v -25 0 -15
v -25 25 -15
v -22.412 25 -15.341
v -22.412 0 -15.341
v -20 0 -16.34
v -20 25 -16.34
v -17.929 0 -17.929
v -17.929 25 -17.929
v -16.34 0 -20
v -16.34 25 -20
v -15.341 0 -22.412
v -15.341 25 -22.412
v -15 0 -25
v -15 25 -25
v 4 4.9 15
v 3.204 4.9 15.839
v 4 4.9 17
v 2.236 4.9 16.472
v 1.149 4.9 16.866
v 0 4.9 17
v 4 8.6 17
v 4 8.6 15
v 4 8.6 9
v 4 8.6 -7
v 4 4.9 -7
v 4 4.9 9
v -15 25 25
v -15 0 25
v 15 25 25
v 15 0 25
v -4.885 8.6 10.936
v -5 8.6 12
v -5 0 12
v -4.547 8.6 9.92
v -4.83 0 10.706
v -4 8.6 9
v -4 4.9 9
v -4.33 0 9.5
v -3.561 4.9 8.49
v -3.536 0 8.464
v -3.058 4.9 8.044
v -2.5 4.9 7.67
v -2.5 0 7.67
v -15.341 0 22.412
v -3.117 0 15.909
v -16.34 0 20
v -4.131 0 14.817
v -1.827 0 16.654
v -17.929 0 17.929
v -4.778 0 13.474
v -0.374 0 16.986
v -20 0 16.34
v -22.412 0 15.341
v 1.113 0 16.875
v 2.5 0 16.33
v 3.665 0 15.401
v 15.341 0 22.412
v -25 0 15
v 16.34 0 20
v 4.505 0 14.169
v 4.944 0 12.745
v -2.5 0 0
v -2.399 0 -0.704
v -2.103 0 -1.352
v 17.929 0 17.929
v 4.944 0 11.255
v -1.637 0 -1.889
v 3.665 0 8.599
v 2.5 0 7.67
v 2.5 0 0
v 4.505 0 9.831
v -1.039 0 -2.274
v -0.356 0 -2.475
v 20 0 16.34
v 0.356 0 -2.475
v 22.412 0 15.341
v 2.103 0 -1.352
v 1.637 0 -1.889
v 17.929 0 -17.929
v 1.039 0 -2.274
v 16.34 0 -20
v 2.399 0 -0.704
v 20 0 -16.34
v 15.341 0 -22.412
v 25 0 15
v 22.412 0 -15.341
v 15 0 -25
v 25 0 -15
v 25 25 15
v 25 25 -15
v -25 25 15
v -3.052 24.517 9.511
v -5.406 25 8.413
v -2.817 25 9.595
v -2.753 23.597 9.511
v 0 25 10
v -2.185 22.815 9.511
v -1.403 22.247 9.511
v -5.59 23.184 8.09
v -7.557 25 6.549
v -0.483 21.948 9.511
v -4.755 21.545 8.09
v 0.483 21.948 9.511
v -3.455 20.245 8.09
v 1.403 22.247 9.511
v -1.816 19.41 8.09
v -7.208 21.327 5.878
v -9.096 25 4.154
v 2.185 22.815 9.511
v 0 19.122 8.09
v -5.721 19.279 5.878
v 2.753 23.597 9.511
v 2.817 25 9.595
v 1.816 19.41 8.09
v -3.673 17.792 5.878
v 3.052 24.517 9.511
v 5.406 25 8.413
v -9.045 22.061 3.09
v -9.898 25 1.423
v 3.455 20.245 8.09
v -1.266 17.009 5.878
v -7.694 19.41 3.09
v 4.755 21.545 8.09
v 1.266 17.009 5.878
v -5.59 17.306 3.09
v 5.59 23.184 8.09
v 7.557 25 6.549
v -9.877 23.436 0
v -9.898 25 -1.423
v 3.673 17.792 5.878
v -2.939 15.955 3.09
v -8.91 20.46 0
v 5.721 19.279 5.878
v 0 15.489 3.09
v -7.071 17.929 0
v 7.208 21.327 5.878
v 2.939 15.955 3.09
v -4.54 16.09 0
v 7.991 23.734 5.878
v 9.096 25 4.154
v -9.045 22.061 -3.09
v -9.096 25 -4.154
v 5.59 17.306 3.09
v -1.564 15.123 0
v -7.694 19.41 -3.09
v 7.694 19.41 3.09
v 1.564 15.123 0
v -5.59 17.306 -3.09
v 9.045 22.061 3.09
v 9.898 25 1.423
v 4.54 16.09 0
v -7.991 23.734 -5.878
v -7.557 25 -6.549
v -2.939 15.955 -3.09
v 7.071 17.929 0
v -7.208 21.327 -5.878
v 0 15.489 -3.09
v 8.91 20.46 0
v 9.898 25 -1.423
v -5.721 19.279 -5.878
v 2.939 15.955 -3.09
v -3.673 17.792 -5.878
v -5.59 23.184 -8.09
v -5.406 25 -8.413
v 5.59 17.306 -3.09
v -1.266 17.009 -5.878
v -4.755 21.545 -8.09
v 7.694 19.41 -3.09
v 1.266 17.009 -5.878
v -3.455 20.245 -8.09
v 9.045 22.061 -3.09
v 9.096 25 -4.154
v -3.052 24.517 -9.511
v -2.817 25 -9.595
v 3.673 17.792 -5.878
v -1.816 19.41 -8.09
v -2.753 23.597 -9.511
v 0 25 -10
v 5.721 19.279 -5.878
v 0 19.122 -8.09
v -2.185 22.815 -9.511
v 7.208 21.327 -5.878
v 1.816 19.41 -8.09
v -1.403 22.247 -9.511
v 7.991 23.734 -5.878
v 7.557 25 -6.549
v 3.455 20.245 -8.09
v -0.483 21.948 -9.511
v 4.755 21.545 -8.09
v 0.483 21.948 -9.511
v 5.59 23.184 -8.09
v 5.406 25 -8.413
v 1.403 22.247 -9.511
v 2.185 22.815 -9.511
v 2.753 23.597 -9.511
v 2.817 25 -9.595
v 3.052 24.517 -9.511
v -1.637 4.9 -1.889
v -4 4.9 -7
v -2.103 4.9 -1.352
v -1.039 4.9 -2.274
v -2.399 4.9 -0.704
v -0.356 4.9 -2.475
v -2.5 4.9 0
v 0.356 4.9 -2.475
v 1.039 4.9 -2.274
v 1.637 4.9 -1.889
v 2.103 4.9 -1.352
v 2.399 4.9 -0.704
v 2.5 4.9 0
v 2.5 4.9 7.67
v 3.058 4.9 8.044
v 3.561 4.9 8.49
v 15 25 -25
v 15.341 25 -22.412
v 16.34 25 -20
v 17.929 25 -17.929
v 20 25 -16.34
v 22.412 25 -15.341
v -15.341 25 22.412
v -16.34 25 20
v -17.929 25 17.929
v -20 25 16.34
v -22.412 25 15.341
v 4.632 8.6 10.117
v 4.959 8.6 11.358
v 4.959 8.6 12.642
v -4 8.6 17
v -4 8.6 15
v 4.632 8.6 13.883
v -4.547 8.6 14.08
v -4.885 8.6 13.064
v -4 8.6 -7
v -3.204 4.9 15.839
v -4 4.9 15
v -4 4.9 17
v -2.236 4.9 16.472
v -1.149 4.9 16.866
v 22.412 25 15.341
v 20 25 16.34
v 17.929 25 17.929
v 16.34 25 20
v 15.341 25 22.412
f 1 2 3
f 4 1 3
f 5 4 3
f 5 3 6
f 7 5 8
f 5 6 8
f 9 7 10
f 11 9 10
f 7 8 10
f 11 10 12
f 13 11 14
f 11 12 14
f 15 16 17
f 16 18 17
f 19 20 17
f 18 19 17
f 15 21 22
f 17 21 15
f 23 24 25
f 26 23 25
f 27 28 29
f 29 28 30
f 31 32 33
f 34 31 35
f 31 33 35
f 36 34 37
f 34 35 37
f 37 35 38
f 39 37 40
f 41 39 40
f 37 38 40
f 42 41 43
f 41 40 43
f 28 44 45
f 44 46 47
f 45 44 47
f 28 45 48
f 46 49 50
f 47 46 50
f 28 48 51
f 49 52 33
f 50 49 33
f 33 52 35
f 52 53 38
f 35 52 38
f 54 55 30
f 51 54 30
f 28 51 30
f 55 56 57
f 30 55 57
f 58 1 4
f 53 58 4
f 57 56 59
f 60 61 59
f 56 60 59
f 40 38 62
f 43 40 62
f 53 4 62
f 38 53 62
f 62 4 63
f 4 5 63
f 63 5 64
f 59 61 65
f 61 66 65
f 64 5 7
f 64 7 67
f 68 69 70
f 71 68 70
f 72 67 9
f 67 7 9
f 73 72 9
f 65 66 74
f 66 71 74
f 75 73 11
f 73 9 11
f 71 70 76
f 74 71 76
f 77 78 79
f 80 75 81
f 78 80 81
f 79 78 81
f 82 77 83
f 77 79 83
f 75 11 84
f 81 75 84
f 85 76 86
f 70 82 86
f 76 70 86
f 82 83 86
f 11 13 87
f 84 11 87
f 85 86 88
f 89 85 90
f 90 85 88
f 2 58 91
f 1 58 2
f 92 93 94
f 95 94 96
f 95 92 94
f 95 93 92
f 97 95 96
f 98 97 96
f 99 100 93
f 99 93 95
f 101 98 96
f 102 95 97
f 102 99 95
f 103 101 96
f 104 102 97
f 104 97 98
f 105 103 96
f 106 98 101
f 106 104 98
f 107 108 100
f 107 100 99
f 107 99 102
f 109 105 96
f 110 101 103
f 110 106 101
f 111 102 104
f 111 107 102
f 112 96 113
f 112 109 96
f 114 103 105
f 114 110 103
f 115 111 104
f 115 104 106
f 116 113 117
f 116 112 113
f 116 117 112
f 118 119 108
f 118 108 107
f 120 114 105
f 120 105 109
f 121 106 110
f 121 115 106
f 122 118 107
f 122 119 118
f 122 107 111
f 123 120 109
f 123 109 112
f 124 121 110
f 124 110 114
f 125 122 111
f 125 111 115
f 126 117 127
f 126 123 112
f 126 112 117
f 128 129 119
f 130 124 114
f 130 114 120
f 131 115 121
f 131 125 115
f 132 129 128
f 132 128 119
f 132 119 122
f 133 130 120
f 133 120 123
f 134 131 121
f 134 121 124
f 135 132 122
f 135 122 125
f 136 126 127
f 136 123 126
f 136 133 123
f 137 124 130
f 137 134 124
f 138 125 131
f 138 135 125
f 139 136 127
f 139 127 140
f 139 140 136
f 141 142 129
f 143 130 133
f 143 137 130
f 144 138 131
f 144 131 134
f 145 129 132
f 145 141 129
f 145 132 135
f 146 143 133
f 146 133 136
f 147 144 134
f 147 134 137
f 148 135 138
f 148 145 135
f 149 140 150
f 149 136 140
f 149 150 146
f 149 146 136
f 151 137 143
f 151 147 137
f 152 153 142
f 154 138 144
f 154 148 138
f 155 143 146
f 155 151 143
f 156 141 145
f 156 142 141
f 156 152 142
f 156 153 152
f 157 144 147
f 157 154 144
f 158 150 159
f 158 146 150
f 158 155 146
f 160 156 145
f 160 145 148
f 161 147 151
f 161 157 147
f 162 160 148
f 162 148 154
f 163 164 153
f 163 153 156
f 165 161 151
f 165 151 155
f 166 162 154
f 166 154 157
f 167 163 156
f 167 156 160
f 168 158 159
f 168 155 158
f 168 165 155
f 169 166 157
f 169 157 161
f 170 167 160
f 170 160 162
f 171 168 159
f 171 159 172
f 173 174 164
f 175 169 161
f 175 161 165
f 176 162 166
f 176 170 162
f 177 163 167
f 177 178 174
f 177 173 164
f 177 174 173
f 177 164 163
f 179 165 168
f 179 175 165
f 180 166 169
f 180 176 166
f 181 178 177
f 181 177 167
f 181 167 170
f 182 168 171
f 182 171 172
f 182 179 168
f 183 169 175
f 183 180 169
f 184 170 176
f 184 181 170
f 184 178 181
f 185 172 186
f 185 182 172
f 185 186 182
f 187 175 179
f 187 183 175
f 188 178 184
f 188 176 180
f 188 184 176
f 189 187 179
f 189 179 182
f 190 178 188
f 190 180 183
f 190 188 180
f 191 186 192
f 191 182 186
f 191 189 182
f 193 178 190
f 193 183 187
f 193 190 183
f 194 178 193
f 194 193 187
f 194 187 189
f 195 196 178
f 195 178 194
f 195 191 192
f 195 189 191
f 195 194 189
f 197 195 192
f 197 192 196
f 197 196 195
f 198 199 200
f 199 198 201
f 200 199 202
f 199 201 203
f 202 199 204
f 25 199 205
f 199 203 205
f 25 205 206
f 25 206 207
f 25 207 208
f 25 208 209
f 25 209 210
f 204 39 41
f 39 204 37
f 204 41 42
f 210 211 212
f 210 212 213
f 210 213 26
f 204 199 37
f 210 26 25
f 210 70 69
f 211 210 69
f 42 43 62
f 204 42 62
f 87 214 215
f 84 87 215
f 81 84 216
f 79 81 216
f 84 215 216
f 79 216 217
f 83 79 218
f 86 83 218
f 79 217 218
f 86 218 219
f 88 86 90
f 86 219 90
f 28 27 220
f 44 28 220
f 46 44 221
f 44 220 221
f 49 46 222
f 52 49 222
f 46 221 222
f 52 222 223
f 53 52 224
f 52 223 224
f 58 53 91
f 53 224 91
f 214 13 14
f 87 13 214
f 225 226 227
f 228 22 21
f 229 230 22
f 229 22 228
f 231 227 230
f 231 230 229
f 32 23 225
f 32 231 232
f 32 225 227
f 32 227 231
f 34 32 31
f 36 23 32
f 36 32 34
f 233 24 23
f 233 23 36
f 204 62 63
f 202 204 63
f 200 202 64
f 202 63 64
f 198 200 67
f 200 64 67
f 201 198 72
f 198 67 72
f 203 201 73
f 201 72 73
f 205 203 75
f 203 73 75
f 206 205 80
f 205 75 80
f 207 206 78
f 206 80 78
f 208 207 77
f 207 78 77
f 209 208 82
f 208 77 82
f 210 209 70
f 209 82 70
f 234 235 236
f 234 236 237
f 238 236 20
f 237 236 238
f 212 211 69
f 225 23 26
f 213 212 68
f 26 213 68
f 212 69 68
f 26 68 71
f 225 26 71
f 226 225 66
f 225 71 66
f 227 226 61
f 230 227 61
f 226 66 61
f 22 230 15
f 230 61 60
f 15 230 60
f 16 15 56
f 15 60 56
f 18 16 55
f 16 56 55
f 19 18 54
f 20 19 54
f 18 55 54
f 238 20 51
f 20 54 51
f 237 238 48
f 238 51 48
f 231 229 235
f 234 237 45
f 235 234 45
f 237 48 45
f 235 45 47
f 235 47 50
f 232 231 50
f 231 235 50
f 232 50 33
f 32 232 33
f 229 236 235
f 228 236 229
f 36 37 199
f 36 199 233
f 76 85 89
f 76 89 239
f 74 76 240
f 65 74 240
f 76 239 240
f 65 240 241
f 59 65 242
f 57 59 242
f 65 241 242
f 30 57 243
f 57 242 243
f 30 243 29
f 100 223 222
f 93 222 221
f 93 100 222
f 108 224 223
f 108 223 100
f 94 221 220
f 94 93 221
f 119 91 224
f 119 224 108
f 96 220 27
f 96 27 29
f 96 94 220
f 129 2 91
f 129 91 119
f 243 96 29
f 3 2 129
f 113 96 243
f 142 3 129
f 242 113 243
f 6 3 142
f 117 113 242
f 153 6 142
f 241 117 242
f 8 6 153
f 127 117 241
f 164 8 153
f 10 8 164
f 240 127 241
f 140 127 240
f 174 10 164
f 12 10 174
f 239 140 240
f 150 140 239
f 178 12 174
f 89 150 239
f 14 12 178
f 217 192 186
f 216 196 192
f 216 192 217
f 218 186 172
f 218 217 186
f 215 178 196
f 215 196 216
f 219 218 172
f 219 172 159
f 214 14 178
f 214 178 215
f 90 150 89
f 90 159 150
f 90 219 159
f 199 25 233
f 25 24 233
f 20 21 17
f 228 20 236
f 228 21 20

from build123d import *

# Parameters (mm, degrees)
SKETCH1_W           = 50
SKETCH1_H           = 50
BOSS_EXTRUDE1_DEPTH = 25
SKETCH2_R           = 10
CUT_EXTRUDE1_DEPTH  = 25
CUT_EXTRUDE6_DEPTH  = 8.6
CUT_EXTRUDE8_START  = -8
CUT_EXTRUDE8_DEPTH  = 24


with BuildPart() as part:
    # Sketch1 → Boss-Extrude1 (new body)
    with BuildSketch(Plane(origin=(0, 0, 0), x_dir=(1, 0, 0), z_dir=(0, 1, 0))):
        Rectangle(SKETCH1_W, SKETCH1_H)
    extrude(amount=BOSS_EXTRUDE1_DEPTH)

    # Sketch2 → Cut-Extrude1 (cut)
    with BuildSketch(Plane(origin=(0, 25, 0), x_dir=(1, 0, 0), z_dir=(0, 1, 0))):
        with Locations((-25, -25)):
            Circle(SKETCH2_R)
        with Locations((-25, 25)):
            Circle(SKETCH2_R)
        with Locations((25, 25)):
            Circle(SKETCH2_R)
        with Locations((25, -25)):
            Circle(SKETCH2_R)
    extrude(amount=-CUT_EXTRUDE1_DEPTH, mode=Mode.SUBTRACT)

    # Sketch3 → Cut-Revolve1 (revolve, cut)
    with BuildSketch(Plane(origin=(0, 25, 0), x_dir=(1, 0, 0), z_dir=(0, 1, 0))):
        with BuildLine():
            Line((0, 10), (0, -10))
            ThreePointArc((0, -10), (-10, 0), (0, 10))
        make_face()
    revolve(axis=Axis((0, 25, -10), (0, 0, 1)), mode=Mode.SUBTRACT)

    # Sketch4 → Cut-Extrude6 (cut)
    with BuildSketch(Plane(origin=(0, 0, 0), x_dir=(-1, 0, 0), z_dir=(0, -1, 0))):
        with BuildLine():
            ThreePointArc((2.5, 0), (0, 2.5), (-2.5, 0))
            Line((-2.5, 0), (2.5, 0))
        make_face()
        with BuildLine():
            Line((2.5, 0), (-2.5, 0))
            ThreePointArc((-2.5, 0), (0, -2.5), (2.5, 0))
        make_face()
        with BuildLine():
            ThreePointArc((2.5, 0), (0, -2.5), (-2.5, 0))
            Line((-2.5, 0), (-2.5, -7.669872981))
            ThreePointArc((-2.5, -7.669872981), (0, -7), (2.5, -7.669872981))
            Line((2.5, -7.669872981), (2.5, 0))
        make_face()
        with BuildLine():
            ThreePointArc((2.5, -7.669872981), (0, -7), (-2.5, -7.669872981))
            Line((-2.5, -7.669872981), (2.5, -7.669872981))
        make_face()
        with BuildLine():
            Line((2.5, -7.669872981), (-2.5, -7.669872981))
            ThreePointArc((-2.5, -7.669872981), (-2.5, -16.330127019), (5, -12))
            ThreePointArc((5, -12), (4.330127019, -9.5), (2.5, -7.669872981))
        make_face()
    extrude(amount=-CUT_EXTRUDE6_DEPTH, mode=Mode.SUBTRACT)

    # Sketch5 → Cut-Extrude8 (cut)
    with BuildSketch(Plane.XY.offset(25).offset(CUT_EXTRUDE8_START)):
        Polygon((0, 4.9), (-4, 4.9), (-4, 8.6), (4, 8.6), (4, 4.9), align=None)
    extrude(amount=-CUT_EXTRUDE8_DEPTH, mode=Mode.SUBTRACT)


solid = part.part
